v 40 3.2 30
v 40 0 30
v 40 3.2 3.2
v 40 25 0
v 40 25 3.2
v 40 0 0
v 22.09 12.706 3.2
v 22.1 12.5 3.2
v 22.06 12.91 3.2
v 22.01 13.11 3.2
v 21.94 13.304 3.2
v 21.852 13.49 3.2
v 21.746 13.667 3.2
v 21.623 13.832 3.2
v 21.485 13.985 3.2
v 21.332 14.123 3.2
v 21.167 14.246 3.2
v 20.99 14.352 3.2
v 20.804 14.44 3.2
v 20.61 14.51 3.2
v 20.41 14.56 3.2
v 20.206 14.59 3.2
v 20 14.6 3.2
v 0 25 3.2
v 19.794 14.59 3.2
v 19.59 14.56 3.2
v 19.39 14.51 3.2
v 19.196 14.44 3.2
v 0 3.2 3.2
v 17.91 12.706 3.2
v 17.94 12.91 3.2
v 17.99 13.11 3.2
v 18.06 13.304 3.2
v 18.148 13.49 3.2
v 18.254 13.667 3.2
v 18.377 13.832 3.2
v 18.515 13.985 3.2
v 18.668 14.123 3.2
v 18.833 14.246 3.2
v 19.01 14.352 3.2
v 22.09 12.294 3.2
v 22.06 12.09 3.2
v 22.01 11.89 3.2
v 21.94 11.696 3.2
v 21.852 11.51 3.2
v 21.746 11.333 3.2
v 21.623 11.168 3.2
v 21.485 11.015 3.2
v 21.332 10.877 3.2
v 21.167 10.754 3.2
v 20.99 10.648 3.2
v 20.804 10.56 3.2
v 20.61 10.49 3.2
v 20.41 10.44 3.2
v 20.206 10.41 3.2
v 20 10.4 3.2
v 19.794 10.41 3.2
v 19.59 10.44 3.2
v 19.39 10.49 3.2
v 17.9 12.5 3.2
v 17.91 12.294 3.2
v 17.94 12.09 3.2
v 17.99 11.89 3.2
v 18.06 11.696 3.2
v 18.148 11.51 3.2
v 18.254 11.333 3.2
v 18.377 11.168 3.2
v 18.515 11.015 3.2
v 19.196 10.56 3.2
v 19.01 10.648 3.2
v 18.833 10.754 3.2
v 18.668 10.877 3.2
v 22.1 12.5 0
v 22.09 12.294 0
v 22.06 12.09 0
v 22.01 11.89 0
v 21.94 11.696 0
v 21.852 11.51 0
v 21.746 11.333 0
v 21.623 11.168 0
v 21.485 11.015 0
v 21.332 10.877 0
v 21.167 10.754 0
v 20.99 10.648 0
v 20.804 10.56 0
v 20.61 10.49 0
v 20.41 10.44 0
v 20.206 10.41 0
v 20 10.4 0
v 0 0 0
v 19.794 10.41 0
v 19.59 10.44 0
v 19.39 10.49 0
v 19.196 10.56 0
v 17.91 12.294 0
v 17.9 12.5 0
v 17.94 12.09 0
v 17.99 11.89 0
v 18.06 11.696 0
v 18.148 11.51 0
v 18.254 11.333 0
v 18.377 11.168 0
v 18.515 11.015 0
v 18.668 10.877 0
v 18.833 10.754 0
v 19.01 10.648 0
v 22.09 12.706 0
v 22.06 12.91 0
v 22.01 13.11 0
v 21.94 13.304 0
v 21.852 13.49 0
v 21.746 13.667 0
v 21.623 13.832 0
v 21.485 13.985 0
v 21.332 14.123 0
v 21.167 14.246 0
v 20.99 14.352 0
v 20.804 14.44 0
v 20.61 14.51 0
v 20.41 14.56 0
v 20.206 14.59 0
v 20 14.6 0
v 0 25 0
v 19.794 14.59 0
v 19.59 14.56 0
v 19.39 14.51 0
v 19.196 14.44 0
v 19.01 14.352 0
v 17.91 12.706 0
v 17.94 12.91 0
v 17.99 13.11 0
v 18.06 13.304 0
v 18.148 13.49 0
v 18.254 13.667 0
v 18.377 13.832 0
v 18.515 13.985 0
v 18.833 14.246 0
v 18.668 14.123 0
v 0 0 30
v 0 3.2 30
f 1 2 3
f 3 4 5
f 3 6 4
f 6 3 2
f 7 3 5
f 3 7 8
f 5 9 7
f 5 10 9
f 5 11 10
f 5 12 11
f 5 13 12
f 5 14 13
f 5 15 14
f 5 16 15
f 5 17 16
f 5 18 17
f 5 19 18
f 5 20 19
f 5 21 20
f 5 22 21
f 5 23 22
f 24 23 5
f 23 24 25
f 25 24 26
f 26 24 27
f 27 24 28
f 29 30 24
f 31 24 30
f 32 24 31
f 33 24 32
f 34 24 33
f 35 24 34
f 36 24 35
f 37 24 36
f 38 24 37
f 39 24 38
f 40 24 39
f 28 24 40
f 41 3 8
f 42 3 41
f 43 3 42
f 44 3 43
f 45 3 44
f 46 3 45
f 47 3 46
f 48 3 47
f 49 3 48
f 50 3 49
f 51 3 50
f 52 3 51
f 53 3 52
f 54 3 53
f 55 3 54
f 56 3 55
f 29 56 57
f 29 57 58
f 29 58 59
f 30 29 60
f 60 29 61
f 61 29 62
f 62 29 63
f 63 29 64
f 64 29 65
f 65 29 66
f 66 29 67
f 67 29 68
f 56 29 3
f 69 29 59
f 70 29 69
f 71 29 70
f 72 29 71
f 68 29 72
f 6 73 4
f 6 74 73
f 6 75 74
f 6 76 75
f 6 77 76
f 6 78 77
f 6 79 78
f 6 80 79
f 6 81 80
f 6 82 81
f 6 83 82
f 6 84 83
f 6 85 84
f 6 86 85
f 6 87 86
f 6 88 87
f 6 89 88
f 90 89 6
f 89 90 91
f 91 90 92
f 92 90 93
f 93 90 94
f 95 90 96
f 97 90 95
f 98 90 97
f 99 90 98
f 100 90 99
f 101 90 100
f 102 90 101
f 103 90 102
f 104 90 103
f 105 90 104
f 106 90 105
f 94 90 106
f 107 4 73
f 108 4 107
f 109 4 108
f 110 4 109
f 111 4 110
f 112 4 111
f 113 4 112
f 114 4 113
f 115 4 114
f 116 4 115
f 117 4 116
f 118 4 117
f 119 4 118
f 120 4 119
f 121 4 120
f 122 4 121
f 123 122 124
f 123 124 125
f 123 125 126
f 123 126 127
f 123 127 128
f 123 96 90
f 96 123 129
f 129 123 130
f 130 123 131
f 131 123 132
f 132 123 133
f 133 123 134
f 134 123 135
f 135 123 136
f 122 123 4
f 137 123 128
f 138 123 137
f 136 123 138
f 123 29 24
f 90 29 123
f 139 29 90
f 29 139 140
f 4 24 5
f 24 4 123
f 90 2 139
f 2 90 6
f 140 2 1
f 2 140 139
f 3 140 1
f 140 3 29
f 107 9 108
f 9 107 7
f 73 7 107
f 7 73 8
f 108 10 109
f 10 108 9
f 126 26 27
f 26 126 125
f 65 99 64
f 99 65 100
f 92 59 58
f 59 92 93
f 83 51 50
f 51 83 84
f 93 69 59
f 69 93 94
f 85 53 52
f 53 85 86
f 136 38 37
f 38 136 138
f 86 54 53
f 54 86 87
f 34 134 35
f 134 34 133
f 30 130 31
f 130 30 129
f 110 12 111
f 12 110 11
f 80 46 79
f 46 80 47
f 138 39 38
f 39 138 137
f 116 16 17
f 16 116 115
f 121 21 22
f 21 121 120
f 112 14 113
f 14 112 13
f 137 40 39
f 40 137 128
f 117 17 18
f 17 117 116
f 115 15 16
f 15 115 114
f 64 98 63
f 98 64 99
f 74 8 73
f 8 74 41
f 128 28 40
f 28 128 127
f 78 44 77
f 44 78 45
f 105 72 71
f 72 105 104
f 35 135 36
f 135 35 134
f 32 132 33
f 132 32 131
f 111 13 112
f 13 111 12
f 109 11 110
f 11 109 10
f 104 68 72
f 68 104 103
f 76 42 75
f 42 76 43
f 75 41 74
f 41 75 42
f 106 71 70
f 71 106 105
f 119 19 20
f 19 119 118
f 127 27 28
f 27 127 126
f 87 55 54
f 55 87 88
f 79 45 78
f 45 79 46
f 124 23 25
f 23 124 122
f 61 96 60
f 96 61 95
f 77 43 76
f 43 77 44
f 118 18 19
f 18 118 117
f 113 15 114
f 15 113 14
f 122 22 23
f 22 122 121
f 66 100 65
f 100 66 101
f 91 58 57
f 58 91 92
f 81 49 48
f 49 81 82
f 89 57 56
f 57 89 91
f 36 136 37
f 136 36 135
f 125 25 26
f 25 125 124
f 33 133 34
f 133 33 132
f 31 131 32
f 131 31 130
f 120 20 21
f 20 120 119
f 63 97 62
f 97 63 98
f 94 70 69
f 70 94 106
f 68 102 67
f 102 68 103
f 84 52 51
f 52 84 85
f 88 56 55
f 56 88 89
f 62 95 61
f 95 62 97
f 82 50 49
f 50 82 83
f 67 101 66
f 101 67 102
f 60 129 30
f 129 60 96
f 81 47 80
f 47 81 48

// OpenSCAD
// Suporte em L com furo de fixação — esqueleto do padrão desta skill:
// inputs mínimos no topo, tudo derivável calculado, assert nos mínimos,
// echo CHK para a revisão conferir, base apoiada em z=0.

// --- inputs (só o que vem da spec; nada de números soltos depois daqui) ---
w      = 40;    // largura [mm]
d      = 25;    // profundidade da base [mm]
h      = 30;    // altura da parede [mm]
wall   = 3.2;   // espessura da base/parede [mm]
hole_d = 4.2;   // Ø do furo de fixação (M4 folgado) [mm]
nozzle = 0.4;   // Ø do bico [mm]

$fn = $preview ? 32 : 64;

// ATENÇÃO: `pi` não existe em OpenSCAD — use a constante PI.
// sin()/cos() recebem GRAUS: rad → graus multiplicando por 180 / PI.

// --- derivados (calculados; não viram input) ---
hole_x  = w / 2;
hole_y  = d / 2;
hole_r  = hole_d / 2;
clear   = min(hole_x - hole_r, hole_y - hole_r);   // material até a borda
hole_z  = -wall;                                   // furo atravessa a base
hole_h  = 3 * wall;

assert(wall >= 2 * nozzle, "parede < 2*nozzle");
assert(hole_d >= 2 * nozzle, "furo < 2*nozzle: não sai redondo");

echo(str("CHK|wall=", wall, "|hole=", hole_d, "@0|clear=", clear, "|h=", h));

module body() {
  cube([w, d, wall]);                  // base
  cube([w, wall, h]);                  // parede vertical em y = 0
}

difference() {
  body();
  translate([hole_x, hole_y, hole_z]) cylinder(h = hole_h, d = hole_d);
}
